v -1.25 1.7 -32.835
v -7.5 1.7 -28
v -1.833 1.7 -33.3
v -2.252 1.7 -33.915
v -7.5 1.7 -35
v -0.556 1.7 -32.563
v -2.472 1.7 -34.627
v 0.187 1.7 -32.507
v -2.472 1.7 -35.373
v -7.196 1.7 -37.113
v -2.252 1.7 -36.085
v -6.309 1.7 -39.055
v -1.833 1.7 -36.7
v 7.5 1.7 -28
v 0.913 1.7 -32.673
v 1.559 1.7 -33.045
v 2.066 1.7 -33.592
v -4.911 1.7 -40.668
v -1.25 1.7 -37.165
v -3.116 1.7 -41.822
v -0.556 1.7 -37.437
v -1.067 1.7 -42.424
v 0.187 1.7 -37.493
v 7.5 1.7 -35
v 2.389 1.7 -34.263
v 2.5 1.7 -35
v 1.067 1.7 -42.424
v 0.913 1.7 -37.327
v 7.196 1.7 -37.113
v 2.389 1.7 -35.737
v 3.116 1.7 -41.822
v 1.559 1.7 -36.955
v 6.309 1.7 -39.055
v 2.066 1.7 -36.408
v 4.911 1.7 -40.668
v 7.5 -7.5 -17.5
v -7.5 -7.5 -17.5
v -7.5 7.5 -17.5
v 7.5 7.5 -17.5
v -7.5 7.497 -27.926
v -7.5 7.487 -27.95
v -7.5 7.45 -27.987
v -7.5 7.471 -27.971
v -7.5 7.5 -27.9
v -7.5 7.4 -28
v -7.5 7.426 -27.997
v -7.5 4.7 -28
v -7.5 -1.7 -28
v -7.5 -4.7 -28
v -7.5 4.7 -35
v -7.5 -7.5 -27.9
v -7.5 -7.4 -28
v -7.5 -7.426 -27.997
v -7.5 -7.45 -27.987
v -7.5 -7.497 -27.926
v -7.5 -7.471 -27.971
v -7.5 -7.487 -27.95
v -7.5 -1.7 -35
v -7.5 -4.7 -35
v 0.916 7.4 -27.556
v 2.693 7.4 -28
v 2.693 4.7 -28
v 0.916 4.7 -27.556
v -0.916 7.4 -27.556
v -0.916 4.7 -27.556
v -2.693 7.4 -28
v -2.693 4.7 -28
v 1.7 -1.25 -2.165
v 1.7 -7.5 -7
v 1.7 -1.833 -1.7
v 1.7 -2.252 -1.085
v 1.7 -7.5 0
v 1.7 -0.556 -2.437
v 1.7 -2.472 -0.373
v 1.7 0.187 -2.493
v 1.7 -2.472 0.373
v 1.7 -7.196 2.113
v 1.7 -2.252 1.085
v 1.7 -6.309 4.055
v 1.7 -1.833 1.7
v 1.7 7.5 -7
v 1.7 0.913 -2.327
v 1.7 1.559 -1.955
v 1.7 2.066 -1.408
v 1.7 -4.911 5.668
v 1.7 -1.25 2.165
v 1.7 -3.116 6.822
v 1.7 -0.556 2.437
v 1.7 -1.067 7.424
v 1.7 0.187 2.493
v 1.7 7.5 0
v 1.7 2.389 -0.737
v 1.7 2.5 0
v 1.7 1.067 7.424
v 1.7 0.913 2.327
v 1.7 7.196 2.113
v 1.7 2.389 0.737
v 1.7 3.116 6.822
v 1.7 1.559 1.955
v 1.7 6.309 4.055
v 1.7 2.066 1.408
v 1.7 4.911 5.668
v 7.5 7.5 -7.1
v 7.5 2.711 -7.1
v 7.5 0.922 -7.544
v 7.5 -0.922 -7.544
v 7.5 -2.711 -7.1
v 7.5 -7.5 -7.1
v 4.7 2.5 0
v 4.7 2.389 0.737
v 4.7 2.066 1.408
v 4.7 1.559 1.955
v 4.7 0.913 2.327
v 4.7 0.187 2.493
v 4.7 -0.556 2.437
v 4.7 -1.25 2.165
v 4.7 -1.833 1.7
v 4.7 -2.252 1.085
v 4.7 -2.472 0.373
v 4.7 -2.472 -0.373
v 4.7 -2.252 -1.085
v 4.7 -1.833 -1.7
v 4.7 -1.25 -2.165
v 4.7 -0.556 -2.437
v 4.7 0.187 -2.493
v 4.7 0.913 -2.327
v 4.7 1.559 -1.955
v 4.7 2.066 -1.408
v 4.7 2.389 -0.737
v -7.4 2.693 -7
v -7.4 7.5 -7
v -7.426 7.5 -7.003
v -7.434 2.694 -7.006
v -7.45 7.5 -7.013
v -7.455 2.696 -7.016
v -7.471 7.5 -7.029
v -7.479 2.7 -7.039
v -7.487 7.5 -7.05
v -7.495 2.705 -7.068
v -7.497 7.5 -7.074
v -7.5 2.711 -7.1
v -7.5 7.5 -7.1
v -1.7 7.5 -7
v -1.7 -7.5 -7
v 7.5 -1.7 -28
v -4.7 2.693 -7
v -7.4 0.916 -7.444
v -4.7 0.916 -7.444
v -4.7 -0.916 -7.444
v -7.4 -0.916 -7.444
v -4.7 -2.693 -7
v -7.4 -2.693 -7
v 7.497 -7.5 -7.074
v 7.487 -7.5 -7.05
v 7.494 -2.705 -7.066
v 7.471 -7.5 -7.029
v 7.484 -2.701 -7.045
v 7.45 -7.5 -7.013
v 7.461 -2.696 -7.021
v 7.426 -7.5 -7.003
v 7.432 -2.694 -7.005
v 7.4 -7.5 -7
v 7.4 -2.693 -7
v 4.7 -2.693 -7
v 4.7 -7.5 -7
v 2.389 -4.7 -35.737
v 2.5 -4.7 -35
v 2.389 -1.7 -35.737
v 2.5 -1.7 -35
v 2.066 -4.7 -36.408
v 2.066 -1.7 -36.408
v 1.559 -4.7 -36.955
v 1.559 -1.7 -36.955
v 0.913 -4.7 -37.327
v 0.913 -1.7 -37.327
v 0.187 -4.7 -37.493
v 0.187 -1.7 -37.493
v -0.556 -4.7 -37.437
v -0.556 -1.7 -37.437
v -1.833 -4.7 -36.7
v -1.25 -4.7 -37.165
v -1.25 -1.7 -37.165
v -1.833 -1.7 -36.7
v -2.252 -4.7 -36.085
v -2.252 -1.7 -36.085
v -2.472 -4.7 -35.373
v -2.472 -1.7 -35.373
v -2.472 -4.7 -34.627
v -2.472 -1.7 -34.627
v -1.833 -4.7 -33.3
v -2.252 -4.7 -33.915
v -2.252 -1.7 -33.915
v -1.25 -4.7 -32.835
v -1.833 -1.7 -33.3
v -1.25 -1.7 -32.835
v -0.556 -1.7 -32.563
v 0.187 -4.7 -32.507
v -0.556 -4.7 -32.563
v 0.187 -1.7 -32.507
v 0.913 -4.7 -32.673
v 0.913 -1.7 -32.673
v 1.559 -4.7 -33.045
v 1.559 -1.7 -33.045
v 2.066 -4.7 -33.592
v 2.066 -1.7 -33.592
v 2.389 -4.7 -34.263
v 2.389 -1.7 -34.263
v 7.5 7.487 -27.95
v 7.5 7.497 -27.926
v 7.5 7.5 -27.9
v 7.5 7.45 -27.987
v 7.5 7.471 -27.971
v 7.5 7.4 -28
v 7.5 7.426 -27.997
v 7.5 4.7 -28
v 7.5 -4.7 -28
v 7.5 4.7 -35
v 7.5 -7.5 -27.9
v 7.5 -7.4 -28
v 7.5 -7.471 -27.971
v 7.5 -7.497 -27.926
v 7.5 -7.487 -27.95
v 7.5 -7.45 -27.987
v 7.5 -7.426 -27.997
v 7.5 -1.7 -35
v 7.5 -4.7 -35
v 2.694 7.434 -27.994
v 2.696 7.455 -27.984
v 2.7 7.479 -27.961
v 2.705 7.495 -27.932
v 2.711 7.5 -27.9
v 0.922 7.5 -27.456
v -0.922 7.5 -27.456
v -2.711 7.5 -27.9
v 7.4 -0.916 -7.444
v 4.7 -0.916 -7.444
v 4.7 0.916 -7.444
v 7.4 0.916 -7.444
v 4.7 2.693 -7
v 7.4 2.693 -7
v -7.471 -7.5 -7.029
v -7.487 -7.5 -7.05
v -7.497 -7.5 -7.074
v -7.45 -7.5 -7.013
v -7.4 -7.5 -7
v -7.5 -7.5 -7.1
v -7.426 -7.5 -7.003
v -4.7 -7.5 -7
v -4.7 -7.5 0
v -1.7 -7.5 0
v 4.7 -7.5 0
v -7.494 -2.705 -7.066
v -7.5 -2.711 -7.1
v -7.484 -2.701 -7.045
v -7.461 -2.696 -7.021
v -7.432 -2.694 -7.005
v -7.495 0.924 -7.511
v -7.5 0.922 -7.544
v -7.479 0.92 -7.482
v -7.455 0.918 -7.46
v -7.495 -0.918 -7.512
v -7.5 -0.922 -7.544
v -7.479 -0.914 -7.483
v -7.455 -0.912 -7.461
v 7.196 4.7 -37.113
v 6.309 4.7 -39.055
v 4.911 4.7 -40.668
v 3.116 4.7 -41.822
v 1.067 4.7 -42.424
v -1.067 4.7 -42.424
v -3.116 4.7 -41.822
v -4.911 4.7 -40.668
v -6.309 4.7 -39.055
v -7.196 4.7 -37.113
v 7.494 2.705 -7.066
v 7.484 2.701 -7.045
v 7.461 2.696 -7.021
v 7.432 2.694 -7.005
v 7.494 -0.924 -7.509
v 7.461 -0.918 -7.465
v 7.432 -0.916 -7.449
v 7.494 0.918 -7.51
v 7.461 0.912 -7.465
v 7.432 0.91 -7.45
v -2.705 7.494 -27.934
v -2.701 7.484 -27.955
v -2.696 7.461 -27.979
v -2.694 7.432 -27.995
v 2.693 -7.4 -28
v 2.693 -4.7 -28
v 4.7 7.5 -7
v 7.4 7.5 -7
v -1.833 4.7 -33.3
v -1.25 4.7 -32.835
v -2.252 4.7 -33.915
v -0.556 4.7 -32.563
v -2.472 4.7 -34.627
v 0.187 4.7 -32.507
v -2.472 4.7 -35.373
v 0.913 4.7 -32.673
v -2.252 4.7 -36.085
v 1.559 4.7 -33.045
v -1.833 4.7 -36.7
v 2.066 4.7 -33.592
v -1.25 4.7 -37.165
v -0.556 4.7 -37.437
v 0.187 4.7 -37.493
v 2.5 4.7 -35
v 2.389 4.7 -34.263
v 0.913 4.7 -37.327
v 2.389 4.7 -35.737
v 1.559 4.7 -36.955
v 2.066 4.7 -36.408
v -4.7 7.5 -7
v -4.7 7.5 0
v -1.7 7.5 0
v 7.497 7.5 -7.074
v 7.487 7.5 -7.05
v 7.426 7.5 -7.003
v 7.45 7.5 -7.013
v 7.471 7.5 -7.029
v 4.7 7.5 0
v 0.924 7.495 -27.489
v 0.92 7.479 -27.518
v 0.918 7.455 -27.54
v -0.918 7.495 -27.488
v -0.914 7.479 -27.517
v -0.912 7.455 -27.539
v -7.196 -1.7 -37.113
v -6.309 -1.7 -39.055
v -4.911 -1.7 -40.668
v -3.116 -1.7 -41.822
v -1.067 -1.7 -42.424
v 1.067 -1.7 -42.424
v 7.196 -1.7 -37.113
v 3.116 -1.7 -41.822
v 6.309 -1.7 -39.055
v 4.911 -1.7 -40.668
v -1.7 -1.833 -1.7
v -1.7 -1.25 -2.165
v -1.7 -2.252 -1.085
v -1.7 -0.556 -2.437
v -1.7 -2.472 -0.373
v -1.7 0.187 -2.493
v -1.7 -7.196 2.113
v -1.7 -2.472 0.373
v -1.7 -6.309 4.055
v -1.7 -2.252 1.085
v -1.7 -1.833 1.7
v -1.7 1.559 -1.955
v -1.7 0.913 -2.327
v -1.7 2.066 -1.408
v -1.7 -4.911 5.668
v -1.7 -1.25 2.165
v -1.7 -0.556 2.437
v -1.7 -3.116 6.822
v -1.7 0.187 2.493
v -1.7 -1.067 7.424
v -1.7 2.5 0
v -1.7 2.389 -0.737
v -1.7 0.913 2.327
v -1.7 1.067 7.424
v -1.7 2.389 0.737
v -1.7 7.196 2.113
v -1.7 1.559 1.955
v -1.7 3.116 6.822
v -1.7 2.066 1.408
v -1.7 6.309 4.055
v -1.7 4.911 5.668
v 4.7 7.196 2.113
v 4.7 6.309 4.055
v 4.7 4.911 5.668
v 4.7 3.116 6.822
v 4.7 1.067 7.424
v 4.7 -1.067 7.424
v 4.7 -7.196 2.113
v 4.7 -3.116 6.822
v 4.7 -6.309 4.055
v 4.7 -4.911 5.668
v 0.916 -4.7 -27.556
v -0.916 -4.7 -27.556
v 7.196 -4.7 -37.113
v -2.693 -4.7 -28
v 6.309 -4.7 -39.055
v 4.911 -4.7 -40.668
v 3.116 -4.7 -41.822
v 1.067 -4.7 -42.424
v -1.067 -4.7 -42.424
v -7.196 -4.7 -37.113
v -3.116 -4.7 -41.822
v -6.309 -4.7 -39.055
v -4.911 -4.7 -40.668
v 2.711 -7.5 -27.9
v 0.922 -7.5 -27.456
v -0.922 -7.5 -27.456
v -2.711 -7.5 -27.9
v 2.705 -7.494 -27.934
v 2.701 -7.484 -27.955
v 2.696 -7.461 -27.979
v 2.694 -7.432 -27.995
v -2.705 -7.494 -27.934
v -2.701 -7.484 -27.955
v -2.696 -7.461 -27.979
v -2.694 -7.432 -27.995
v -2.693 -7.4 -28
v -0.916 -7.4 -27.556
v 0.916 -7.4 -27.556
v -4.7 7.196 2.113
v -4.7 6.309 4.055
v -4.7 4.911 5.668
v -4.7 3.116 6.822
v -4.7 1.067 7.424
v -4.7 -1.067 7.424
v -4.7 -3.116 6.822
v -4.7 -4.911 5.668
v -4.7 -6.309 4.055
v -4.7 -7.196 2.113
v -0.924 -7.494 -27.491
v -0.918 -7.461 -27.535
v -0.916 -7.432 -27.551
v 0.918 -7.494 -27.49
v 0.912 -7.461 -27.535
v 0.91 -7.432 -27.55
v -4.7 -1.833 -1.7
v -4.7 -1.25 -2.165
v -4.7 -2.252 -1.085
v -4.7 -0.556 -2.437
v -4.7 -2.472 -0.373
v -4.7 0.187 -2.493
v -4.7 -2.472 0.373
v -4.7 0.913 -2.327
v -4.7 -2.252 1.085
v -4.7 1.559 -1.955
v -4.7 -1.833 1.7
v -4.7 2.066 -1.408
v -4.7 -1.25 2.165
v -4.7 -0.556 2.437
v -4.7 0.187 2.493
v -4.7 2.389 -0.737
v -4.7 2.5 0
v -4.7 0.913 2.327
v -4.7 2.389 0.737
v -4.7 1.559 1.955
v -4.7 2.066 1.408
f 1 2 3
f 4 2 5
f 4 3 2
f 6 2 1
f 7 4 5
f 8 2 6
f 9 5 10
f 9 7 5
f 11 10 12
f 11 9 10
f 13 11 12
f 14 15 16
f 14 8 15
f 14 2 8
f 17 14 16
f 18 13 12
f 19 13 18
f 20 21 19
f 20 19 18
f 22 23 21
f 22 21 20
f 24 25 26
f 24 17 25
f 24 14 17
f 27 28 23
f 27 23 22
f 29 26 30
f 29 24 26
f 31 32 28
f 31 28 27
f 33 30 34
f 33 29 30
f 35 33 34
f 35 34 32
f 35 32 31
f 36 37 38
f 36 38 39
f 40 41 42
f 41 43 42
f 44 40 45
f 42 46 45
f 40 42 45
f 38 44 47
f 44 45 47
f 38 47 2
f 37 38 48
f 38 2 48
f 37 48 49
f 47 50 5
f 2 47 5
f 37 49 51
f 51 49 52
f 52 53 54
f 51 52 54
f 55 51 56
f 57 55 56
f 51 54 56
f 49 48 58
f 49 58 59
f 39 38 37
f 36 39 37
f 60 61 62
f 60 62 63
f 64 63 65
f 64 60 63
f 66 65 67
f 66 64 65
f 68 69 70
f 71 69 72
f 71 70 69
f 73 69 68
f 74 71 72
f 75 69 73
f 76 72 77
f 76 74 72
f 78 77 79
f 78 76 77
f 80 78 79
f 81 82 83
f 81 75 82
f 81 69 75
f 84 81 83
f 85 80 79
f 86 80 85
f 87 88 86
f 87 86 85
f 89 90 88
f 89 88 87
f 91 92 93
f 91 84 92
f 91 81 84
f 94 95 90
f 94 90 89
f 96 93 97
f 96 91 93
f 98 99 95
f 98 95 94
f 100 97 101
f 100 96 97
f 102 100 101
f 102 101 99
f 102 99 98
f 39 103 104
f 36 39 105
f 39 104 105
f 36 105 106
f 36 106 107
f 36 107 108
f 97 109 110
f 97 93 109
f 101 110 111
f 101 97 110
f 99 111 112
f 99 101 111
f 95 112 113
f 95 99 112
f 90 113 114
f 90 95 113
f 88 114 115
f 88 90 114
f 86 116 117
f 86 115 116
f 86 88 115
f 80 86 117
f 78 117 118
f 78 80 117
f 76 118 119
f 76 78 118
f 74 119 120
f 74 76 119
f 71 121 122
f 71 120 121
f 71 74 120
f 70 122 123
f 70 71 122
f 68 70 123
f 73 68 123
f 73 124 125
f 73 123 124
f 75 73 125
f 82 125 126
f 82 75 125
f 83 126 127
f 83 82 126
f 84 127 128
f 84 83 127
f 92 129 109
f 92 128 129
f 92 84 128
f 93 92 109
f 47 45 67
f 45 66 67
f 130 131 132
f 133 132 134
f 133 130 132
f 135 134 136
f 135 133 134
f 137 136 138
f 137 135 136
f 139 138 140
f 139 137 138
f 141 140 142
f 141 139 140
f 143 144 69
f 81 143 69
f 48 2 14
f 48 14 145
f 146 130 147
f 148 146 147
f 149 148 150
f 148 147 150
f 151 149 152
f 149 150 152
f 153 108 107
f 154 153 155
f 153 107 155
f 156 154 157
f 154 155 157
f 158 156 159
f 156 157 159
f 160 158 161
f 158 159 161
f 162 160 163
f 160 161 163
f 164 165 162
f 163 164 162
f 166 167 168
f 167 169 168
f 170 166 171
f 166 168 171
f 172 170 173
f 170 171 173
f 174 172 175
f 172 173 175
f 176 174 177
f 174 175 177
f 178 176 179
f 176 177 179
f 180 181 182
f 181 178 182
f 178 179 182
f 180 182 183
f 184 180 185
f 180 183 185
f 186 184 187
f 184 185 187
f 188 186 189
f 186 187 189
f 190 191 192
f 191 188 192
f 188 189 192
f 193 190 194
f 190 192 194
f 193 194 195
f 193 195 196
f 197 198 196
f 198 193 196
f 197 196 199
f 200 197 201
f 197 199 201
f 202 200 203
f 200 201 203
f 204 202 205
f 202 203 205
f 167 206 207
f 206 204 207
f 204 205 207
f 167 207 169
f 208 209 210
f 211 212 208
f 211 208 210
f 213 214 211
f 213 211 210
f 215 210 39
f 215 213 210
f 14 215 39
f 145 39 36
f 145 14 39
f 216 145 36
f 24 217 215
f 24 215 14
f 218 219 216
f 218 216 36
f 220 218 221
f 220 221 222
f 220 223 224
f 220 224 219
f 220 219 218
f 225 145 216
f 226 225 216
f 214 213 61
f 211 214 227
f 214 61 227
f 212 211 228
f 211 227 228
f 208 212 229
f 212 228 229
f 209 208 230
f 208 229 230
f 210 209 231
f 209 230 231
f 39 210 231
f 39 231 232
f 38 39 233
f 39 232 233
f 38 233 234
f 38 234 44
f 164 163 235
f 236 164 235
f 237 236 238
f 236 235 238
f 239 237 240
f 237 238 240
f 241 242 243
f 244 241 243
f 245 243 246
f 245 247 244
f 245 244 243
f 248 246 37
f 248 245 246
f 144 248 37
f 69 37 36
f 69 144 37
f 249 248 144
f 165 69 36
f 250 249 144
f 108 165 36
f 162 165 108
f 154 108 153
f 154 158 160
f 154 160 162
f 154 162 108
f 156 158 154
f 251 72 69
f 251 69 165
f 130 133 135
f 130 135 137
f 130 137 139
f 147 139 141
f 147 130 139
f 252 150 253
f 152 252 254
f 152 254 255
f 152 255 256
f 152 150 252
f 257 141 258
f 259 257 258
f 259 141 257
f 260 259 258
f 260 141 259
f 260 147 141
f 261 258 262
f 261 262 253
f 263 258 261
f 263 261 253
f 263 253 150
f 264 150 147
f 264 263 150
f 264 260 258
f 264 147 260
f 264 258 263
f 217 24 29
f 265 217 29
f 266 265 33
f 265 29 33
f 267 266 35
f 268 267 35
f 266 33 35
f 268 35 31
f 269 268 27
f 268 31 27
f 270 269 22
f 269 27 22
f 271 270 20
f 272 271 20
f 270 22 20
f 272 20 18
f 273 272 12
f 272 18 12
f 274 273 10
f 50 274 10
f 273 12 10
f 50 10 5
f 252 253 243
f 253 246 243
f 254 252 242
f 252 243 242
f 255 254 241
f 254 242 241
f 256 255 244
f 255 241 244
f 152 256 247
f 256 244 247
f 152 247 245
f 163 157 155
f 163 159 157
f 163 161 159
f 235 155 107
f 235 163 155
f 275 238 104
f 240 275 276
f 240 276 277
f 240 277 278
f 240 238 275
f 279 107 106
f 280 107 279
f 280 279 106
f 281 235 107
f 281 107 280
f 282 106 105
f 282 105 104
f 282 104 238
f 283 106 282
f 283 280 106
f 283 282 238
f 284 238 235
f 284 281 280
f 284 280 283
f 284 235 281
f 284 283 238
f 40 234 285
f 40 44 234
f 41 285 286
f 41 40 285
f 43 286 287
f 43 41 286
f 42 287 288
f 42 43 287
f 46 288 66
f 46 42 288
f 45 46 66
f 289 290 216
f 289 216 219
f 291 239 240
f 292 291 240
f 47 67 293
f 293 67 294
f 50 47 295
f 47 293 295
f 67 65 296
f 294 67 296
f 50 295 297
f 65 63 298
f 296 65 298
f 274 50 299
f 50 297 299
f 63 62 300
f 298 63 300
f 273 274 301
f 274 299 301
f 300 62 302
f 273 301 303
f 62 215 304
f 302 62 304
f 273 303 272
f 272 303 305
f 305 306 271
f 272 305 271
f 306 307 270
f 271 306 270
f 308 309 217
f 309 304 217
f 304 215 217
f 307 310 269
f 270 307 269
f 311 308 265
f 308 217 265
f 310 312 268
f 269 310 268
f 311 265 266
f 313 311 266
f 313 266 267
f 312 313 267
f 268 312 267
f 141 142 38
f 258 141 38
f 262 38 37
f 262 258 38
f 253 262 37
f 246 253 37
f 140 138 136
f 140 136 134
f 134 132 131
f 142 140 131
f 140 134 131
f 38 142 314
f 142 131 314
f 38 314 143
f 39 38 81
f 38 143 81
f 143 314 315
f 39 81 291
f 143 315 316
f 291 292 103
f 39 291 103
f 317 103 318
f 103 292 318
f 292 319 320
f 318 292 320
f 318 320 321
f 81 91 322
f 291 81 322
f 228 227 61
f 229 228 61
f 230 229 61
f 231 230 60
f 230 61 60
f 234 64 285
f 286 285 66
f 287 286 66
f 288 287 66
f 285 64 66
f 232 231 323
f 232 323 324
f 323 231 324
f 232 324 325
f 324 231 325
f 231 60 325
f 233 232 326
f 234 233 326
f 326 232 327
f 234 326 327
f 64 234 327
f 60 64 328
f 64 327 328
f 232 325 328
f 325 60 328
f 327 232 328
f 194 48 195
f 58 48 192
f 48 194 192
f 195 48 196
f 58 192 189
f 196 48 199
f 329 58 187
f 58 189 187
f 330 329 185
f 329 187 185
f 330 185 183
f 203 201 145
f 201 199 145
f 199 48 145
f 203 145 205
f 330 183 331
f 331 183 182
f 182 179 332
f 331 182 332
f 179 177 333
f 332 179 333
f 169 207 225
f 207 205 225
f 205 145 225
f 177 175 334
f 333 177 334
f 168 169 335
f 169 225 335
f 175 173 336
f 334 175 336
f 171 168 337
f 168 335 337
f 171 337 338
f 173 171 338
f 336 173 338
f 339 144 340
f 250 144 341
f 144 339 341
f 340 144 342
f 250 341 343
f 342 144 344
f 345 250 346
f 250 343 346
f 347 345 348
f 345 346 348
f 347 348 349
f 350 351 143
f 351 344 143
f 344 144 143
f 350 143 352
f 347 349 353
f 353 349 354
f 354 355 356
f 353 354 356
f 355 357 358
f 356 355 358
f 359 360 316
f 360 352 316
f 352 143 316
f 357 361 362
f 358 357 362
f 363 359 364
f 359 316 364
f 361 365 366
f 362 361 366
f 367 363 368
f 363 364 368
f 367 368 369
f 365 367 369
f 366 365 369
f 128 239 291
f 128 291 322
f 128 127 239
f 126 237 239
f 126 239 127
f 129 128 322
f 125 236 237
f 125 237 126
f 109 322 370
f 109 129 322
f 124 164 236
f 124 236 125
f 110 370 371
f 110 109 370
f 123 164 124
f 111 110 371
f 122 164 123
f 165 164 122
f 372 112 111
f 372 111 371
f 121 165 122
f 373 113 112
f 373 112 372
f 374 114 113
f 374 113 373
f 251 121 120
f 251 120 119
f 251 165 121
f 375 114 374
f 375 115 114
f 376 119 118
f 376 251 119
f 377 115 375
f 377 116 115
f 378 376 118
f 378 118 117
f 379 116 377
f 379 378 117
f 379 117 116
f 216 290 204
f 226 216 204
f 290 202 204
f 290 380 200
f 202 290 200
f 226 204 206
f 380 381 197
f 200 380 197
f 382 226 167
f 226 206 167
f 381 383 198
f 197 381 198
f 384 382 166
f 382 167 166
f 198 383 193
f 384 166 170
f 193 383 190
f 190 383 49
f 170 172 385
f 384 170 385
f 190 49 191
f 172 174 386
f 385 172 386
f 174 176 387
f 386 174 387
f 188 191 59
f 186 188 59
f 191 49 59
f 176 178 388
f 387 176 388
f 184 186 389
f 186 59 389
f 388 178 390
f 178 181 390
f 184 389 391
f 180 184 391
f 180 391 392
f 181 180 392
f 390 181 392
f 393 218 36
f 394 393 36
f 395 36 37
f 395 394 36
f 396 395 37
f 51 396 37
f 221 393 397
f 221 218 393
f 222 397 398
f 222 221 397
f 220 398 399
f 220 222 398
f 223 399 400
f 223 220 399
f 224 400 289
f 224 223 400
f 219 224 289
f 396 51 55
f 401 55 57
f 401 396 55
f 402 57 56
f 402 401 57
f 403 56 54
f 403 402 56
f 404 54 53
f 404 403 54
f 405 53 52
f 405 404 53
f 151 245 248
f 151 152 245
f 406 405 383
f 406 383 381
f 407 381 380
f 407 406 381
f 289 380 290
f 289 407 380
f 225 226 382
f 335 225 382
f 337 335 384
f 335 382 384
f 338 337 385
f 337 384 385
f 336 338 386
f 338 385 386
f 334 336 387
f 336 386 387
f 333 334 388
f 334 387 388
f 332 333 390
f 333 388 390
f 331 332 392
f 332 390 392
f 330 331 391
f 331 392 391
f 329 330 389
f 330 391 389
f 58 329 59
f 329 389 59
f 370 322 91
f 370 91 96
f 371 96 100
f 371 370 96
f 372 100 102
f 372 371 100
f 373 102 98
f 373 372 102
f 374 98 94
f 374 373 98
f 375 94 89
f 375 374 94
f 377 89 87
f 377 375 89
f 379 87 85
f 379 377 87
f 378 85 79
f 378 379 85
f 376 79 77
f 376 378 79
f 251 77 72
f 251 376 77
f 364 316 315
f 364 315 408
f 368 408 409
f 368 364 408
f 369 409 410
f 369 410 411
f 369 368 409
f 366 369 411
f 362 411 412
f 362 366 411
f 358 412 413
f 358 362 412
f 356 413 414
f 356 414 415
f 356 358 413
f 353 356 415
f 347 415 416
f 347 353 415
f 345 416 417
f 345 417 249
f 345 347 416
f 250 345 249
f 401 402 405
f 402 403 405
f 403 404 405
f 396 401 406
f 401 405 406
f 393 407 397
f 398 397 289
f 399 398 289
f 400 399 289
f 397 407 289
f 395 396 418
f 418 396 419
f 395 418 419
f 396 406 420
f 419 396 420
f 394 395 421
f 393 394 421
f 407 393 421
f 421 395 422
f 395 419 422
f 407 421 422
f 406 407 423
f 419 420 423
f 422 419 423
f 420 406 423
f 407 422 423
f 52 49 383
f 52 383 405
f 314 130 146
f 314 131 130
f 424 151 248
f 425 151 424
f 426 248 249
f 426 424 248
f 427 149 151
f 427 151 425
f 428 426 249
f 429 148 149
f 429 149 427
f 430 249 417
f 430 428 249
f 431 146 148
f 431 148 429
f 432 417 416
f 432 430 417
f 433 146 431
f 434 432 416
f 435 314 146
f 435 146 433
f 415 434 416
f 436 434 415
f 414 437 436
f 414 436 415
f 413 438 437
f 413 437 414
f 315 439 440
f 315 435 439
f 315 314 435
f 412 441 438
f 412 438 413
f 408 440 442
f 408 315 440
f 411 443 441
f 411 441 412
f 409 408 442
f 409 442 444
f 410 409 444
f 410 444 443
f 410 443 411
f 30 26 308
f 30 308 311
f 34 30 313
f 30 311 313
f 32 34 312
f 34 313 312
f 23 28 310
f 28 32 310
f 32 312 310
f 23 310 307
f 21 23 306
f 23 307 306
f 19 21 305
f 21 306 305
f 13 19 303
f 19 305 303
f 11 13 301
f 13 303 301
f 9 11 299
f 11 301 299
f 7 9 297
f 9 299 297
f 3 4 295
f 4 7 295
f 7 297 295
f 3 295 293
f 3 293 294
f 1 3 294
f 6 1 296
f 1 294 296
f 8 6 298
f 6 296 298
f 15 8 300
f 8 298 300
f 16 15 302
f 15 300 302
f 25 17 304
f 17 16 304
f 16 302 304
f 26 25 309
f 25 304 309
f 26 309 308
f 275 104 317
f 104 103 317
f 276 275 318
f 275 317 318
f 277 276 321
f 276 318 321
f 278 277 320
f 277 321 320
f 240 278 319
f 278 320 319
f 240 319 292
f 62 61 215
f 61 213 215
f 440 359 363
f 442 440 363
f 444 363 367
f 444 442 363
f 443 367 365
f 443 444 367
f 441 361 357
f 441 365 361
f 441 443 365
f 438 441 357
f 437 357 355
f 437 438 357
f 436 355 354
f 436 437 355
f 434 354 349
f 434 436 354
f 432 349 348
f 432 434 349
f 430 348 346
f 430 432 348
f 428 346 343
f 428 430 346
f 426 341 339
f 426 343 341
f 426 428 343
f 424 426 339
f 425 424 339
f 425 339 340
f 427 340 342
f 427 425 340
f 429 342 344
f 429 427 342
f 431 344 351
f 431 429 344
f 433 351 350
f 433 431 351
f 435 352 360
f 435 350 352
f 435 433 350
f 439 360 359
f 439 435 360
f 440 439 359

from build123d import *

# Parameters (mm, degrees)
F1_R      = 2.5
F2_DEPTH  = 7.5
F3_W      = 3.4
F3_H      = 15.4505071864
F3_W_2    = 3.8797123611
F3_W_3    = 3.8316924378
F4_DEPTH  = 16.41578
F6_DEPTH  = 2.8
F8_DEPTH  = 2.8
F9_R      = 0.1
F10_W     = 15
F10_H     = 15
F11_DEPTH = 5
F14_ANGLE = 90


with BuildPart() as f2:
    # F1 (on Right) → F2 (new body, symmetric)
    with BuildSketch(Plane.YZ):
        with BuildLine():
            Line((7.5, -12.5), (7.5, 0))
            ThreePointArc((7.5, 0), (0, 7.5), (-7.5, 0))
            Line((-7.5, 0), (-7.5, -12.5))
            Line((-7.5, -12.5), (7.5, -12.5))
        make_face()
        Circle(F1_R, mode=Mode.SUBTRACT)
    extrude(amount=F2_DEPTH, both=True)

    # F3 (on Front) → F4 (cut, symmetric)
    with BuildSketch(Plane.XZ):
        with Locations((0, 0.7252535932)):
            Rectangle(F3_W, F3_H)
        with Locations((-6.6398561805, 0.7252535932)):
            Rectangle(F3_W_2, F3_H)
        with Locations((6.6158462189, 0.7252535932)):
            Rectangle(F3_W_3, F3_H)
    extrude(amount=F4_DEPTH, both=True, mode=Mode.SUBTRACT)

    # F5 (on face) → F6 (cut, through all)
    with BuildSketch(Plane(origin=(-7.5, 0, 0), x_dir=(0, -1, 0), z_dir=(-1, 0, 0))):
        with BuildLine():
            ThreePointArc((2.6925824036, -7), (6.1824092402, -4.2459175671), (7.5, 0))
            ThreePointArc((7.5, 0), (-4.2459175671, 6.1824092402), (-2.6925824036, -7))
            Line((-2.6925824036, -7), (2.6925824036, -7))
        make_face()
        with BuildLine():
            Line((2.6925824036, -7), (-2.6925824036, -7))
            ThreePointArc((-2.6925824036, -7), (0, -7.5), (2.6925824036, -7))
        make_face()
    extrude(amount=-F6_DEPTH, mode=Mode.SUBTRACT)

    # F7 (on face) → F8 (cut, through all)
    with BuildSketch(Plane.YZ.offset(7.5)):
        with BuildLine():
            Line((2.6925824036, -7), (-2.6925824036, -7))
            ThreePointArc((-2.6925824036, -7), (0, -7.5), (2.6925824036, -7))
        make_face()
        with BuildLine():
            ThreePointArc((2.6925824036, -7), (6.1824092402, -4.2459175671), (7.5, 0))
            ThreePointArc((7.5, 0), (-4.2459175671, 6.1824092402), (-2.6925824036, -7))
            Line((-2.6925824036, -7), (2.6925824036, -7))
        make_face()
    extrude(amount=-F8_DEPTH, mode=Mode.SUBTRACT)

    # F9
    f9_edges = [f2.edges().sort_by_distance(p)[0] for p in [
        (7.5, -5.096291, -7),
        (7.5, 0, -7.5),
        (7.5, 5.096291, -7),
        (-7.5, 5.096291, -7),
        (-7.5, 0, -7.5),
        (-7.5, -5.096291, -7),
    ]]
    fillet(f9_edges, radius=F9_R)

    # F10 (on face) → F11 (join)
    with BuildSketch(Plane(origin=(0, 0, -12.5), x_dir=(1, 0, 0), z_dir=(0, 0, -1))):
        Rectangle(F10_W, F10_H)
    extrude(amount=F11_DEPTH)


with BuildPart() as f12_1:
    # F12: instance of F2
    add(f2.part.mirror(Plane(origin=(0, 0, -17.5), x_dir=(1, 0, 0), z_dir=(0, 0, -1))))


with BuildPart() as f12_1_1:
    # F14: moved
    add(f12_1.part.rotate(Axis((0, 0, -17.4657253083), (0, 0, -1)), F14_ANGLE))


solid = Compound([f2.part, f12_1_1.part])
